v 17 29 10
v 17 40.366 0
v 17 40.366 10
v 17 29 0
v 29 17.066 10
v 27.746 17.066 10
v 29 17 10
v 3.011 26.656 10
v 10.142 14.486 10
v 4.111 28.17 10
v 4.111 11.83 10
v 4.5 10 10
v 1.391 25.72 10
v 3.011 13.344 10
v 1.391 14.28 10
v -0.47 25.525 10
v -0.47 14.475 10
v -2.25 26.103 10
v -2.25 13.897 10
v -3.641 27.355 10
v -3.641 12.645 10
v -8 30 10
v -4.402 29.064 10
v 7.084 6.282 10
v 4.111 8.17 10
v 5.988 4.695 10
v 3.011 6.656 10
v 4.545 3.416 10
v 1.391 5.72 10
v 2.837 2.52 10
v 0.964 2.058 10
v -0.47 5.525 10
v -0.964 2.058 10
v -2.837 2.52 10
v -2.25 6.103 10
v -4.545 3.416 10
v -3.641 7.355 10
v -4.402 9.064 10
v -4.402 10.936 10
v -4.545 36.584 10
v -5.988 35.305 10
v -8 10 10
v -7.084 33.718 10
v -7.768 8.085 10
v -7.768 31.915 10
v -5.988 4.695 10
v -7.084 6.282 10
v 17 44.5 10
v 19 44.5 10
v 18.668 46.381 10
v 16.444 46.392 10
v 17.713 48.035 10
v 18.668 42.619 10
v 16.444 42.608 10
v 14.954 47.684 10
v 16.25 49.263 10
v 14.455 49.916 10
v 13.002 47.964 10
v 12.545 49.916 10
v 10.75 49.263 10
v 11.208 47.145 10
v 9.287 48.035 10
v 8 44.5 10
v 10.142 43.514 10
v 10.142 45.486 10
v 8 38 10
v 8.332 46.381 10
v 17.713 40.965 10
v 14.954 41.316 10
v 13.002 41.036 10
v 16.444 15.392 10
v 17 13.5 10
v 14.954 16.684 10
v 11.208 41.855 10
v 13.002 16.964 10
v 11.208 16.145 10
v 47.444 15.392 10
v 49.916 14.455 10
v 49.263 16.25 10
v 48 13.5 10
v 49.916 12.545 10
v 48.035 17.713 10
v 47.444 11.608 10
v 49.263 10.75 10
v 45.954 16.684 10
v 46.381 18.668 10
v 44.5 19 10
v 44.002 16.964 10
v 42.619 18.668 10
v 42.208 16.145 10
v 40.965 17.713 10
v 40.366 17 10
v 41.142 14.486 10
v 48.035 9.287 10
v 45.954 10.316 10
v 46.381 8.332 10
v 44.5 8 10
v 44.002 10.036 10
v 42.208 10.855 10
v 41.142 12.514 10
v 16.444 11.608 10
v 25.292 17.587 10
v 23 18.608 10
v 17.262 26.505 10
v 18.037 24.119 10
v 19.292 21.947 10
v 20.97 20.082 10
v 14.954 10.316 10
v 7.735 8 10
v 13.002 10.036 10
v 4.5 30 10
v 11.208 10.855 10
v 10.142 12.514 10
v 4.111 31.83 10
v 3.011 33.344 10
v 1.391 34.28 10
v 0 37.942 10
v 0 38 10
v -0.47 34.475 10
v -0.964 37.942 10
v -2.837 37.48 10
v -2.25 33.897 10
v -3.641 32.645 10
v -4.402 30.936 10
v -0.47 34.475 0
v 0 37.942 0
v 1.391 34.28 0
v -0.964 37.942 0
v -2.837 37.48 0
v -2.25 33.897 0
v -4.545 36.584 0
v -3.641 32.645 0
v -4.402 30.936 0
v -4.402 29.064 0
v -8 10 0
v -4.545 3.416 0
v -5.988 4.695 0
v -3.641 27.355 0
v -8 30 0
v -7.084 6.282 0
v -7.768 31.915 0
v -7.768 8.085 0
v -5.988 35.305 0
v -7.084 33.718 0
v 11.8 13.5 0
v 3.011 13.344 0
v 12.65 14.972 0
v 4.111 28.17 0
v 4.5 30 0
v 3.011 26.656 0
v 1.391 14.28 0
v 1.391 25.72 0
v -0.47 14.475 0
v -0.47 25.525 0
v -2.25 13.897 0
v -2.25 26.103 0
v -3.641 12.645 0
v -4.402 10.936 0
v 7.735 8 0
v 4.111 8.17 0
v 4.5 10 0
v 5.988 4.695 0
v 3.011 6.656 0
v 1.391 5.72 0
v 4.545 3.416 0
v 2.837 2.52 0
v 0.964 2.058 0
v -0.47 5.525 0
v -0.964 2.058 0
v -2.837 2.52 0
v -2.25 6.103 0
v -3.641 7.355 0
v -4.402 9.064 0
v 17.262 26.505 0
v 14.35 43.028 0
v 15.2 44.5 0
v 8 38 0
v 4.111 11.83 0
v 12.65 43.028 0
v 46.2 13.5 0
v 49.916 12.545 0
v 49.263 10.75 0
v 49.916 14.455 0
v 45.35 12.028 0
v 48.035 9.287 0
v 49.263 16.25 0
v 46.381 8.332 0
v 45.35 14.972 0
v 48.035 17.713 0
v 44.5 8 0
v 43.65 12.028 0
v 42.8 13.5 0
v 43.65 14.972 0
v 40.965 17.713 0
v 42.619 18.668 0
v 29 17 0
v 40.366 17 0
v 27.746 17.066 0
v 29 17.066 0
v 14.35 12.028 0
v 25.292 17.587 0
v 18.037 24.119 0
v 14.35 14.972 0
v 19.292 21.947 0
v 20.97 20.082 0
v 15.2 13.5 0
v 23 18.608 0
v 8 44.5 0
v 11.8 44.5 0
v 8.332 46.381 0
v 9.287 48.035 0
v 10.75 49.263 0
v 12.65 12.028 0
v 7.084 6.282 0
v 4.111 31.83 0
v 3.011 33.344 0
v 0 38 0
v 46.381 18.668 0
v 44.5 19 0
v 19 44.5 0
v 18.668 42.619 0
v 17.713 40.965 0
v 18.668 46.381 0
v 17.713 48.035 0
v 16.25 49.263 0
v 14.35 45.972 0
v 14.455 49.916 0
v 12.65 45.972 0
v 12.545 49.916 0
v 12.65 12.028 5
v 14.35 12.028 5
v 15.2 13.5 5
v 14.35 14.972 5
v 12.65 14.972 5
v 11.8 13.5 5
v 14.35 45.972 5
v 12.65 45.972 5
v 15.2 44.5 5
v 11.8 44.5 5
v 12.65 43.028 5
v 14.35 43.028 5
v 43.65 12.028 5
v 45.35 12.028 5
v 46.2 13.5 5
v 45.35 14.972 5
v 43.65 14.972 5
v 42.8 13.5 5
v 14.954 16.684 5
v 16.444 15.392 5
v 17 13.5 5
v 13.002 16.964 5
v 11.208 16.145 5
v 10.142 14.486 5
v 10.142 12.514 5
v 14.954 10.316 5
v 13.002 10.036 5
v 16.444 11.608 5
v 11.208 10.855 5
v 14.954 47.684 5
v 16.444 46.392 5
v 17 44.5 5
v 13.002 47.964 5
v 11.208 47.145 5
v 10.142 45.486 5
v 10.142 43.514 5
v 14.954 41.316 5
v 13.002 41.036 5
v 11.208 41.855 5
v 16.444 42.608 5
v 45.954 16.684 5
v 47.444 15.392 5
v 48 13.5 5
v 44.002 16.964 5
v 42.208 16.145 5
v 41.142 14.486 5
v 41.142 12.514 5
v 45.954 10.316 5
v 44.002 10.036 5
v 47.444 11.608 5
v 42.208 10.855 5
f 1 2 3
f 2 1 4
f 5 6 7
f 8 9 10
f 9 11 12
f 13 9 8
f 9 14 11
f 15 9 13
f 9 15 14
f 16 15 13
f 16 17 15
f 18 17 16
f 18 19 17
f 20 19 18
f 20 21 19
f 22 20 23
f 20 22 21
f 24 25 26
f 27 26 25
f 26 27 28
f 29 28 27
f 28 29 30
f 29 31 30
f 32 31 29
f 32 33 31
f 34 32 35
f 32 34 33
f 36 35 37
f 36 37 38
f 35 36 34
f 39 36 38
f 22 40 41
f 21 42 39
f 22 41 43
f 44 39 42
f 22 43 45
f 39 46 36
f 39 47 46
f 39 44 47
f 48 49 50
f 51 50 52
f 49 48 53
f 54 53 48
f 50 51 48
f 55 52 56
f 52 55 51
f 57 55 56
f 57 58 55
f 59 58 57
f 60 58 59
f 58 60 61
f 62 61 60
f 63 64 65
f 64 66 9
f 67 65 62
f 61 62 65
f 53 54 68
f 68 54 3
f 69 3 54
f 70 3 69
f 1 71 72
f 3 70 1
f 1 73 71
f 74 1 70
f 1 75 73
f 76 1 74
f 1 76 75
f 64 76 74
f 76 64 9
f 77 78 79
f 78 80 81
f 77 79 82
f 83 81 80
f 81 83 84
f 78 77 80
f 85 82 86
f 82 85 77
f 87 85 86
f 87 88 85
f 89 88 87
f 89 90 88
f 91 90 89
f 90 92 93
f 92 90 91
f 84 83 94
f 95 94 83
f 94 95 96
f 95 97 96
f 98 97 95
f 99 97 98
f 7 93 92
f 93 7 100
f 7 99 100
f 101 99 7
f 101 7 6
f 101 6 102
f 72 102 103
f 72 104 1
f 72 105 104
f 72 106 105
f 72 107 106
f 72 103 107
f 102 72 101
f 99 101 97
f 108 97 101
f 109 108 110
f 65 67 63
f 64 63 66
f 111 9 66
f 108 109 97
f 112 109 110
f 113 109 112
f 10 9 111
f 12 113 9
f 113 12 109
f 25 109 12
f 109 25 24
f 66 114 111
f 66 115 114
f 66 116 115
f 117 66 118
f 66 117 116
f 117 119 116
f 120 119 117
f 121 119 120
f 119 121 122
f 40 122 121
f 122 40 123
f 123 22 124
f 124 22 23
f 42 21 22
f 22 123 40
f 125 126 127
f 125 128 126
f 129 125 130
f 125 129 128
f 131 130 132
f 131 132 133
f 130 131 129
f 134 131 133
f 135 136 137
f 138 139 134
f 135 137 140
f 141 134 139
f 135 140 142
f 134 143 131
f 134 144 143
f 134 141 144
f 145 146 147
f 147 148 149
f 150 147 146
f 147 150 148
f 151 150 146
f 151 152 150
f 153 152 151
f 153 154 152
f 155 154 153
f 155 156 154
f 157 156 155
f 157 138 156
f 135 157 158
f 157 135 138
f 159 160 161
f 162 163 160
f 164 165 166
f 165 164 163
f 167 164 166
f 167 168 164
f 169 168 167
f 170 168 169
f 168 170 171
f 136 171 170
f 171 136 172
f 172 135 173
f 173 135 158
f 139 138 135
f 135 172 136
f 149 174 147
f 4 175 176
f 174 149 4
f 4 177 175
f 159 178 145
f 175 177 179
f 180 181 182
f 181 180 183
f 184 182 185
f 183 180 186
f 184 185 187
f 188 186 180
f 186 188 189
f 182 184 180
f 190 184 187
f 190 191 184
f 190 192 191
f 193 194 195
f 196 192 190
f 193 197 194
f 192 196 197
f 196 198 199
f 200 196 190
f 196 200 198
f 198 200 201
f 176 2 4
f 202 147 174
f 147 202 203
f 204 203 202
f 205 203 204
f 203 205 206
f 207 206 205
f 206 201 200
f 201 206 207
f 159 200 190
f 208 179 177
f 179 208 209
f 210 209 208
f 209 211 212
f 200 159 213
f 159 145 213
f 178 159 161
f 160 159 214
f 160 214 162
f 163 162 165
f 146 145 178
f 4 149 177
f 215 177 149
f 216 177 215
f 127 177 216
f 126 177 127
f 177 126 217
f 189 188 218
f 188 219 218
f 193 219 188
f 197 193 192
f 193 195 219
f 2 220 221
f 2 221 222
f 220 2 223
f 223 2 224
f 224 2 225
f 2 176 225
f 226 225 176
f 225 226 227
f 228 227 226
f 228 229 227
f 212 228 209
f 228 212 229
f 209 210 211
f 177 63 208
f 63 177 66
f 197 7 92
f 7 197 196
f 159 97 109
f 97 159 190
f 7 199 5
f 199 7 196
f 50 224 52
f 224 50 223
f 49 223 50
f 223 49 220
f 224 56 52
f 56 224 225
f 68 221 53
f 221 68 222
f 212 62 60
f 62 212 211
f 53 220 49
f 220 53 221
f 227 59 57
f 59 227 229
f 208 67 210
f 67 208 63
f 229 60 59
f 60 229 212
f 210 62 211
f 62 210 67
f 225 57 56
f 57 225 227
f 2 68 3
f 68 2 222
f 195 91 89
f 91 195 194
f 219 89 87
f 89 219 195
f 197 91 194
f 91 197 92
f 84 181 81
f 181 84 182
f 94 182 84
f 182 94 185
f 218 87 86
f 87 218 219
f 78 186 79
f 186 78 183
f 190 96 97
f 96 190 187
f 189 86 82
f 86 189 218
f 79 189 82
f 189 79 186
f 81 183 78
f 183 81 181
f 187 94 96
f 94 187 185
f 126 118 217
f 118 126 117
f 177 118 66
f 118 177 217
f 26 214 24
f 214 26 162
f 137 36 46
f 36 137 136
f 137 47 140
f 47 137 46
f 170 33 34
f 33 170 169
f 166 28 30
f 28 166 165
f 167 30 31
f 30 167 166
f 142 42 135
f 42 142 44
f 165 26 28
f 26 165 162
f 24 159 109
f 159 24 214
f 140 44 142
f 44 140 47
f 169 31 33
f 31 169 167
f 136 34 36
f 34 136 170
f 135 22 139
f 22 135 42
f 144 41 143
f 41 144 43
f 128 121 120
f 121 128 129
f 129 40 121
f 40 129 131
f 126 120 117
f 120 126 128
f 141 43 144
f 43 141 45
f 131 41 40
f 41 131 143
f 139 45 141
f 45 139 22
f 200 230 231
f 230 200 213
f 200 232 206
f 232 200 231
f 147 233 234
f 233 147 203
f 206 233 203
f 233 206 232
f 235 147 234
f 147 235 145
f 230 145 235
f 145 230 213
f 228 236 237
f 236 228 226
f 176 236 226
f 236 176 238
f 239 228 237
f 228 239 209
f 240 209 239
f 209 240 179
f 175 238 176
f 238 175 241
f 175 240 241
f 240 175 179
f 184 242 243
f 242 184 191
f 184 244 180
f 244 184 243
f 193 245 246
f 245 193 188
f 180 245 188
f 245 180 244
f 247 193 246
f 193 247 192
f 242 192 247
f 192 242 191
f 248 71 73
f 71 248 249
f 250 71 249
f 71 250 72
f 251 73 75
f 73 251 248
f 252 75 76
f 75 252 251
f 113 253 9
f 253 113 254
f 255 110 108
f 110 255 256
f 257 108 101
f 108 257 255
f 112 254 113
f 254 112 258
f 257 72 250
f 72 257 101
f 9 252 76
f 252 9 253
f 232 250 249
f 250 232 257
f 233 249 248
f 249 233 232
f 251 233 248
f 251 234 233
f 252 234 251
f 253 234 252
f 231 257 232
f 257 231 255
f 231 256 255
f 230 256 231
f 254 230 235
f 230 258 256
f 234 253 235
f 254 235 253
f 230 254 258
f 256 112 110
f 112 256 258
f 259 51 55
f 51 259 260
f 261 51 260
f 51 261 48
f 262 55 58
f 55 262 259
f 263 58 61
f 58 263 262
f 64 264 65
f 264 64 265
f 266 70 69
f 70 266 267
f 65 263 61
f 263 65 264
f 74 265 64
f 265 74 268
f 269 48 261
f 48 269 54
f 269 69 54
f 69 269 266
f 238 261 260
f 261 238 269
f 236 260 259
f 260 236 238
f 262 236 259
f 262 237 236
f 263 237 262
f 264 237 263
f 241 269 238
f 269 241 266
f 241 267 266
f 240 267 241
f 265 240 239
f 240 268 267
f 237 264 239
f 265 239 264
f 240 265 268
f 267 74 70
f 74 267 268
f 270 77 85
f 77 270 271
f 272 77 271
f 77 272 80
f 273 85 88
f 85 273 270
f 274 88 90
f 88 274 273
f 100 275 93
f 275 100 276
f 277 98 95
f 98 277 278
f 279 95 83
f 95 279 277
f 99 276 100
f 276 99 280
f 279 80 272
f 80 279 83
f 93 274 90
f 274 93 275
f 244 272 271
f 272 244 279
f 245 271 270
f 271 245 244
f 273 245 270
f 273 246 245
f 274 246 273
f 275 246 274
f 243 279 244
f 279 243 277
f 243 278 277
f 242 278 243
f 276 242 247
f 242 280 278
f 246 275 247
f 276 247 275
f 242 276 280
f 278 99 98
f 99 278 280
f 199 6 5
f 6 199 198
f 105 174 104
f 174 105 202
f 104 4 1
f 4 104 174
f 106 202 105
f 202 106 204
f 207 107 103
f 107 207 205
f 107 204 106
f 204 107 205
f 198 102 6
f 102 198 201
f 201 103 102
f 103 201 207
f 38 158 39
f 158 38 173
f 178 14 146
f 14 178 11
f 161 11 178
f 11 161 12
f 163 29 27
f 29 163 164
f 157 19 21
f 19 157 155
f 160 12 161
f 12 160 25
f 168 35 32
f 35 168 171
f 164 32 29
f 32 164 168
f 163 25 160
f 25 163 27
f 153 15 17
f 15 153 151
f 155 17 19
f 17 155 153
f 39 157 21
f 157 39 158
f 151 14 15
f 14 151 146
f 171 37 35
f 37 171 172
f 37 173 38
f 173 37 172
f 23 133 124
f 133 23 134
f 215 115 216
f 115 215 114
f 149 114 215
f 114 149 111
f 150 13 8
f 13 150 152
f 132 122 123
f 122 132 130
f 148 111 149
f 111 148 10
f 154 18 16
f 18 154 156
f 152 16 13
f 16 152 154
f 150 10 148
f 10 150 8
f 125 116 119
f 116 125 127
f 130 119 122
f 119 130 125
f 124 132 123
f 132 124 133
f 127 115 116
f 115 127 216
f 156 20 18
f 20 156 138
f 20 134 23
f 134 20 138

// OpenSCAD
// PRUSA iteration3
// Y motor mount
// GNU GPL v3
// Josef Průša <iam@josefprusa.cz> and contributors
// http://www.reprap.org/wiki/Prusa_Mendel
// http://prusamendel.org

//include <configuration.scad>

module y_motor_base(){
 // Motor holding part
 translate(v = [29,-21+50,0]){
  translate(v = [-21+4.5,0,5]) cube(size = [9,31,10], center=true);
  translate(v = [-21+4.5+31/2+1,0-31/2-1,5]) cube(size = [31,9,10], center=true);
  //translate(v = [-15.5,-15.5,0]) cylinder(h = 10, r=5.5);
  translate(v = [-15.5,-15.5,0]) cube(size=[15.5,15.5,10], center=false);
  translate(v = [-15.5,+15.5,0]) cylinder(h = 10, r=5.5);
  translate(v = [+15.5,-15.5,0]) rotate([0,0,90]) cylinder(h = 10, r=5.5);
  // Joins motor holder and rod plate
  translate(v = [-29,-21,0]) cube(size = [14,30,10]);
 }
 // Front holding part
 translate(v = [0,10,0]) cylinder(h = 10, r=8);
 translate(v = [0,20,5])cube(size = [16,20,10], center=true);	
 translate(v = [0,30,0])cylinder(h = 10, r=8);
}

module y_motor_holes(){
 translate(v = [29,-21+50,0]){
  // Screw head holes
  translate(v = [-15.5,-15.5,-1]) cylinder(h = 10, r=1.7);
  translate(v = [-15.5,+15.5,-1]) cylinder(h = 10, r=1.7);
  translate(v = [+15.5,-15.5,-1]) cylinder(h = 10, r=1.7);
  // Screw holes
  translate(v = [-15.5,-15.5,5]) cylinder(h = 7, r=3.5);
  translate(v = [-15.5,+15.5,5]) cylinder(h = 7, r=3.5);
  translate(v = [+15.5,-15.5,5]) cylinder(h = 7, r=3.5);
  // Shaft hole
  translate(v = [0,0,5]) cylinder(h = 11, r = 12, center = true);
 }
 translate(v = [0,10,-1]) cylinder(h = 12, r=4.5);	
 translate(v = [0,30,-1])cylinder(h = 12, r=4.5);
}

// Final part
module y_motor(){
 difference(){
  y_motor_base();
  y_motor_holes();
 }
}

y_motor();
